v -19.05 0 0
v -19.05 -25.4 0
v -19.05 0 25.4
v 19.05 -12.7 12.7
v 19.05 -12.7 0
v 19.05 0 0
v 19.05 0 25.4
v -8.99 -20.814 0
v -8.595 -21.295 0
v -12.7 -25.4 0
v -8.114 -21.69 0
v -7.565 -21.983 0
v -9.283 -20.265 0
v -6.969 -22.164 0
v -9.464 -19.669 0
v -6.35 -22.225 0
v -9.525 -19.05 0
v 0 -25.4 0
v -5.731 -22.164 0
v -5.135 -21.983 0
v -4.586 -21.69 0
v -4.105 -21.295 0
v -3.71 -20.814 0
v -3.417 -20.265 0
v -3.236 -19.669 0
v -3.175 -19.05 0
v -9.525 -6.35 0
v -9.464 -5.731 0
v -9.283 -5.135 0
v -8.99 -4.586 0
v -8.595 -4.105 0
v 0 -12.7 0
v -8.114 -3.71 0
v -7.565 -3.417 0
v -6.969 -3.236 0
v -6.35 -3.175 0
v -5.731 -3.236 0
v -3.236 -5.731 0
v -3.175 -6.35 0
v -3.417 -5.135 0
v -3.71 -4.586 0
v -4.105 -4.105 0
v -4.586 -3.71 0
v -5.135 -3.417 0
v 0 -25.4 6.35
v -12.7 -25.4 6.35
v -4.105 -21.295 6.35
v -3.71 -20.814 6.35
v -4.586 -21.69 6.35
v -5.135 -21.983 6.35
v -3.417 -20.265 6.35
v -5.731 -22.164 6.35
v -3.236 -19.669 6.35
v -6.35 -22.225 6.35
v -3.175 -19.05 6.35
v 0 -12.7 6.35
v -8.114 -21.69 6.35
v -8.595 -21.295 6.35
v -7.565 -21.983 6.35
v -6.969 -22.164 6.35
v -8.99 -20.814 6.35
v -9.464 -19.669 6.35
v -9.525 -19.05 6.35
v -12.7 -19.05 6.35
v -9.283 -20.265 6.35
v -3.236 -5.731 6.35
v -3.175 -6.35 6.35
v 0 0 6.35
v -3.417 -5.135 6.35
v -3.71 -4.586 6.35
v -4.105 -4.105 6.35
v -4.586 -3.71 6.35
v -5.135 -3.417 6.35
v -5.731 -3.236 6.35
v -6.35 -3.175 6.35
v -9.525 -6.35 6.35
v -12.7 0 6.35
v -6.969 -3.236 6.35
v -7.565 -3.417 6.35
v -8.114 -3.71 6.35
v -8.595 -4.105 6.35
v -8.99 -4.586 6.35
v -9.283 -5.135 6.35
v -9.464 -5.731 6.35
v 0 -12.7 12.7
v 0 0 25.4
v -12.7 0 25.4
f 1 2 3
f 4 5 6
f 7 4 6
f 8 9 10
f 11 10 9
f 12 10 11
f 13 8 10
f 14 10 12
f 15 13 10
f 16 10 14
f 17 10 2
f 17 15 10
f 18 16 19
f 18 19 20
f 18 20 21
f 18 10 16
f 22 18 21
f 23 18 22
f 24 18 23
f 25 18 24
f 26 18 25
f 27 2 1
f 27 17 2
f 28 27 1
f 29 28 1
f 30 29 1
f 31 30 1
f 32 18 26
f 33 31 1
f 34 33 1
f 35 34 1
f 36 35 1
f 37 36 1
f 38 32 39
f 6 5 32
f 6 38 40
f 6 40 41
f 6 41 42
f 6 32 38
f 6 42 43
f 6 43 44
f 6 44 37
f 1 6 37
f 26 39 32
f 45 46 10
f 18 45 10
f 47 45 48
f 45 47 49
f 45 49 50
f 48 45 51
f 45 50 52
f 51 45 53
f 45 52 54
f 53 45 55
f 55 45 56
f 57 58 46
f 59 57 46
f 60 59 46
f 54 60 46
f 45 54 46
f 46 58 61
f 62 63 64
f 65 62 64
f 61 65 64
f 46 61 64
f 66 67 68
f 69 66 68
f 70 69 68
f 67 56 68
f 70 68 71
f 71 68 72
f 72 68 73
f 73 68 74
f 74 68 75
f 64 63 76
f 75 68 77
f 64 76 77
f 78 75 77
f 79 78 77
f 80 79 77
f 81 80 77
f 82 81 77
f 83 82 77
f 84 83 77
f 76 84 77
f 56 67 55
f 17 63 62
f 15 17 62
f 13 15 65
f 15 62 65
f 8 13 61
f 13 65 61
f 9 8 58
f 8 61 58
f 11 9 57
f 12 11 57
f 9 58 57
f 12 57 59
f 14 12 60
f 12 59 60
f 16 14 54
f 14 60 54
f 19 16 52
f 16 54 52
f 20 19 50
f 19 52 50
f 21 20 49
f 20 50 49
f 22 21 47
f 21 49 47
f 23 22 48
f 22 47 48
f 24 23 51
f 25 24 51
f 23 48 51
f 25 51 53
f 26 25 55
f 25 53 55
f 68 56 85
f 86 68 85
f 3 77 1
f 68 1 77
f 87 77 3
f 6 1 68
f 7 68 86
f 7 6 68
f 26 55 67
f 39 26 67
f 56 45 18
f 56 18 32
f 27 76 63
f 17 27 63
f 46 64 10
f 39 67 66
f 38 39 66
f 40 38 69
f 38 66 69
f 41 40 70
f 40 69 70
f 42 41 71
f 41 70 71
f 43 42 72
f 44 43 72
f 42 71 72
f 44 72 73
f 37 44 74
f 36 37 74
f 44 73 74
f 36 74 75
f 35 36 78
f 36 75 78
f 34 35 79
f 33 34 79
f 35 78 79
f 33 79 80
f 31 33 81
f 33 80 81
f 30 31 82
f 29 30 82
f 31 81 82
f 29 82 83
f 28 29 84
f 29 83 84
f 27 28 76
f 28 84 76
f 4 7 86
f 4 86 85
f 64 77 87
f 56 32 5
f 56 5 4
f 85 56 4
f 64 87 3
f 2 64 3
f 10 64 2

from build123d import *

# Parameters (mm, degrees)
F1_DEPTH = 19.05
F2_DEPTH = 19.05
F3_W     = 12.7
F3_H     = 19.05
F4_DEPTH = 25.4
F6_DEPTH = 6.35
F8_DEPTH = 6.35


with BuildPart() as f1:
    # F0 (on Right) → F1 (new body, symmetric)
    with BuildSketch(Plane.YZ):
        Polygon((-12.7, 0), (0, 0), (0, 25.4), (-12.7, 12.7), (-12.7, 6.35), align=None)
        Polygon((-25.4, 0), (-12.7, 0), (-12.7, 6.35), (-19.05, 6.35), align=None)
        Polygon((-12.7, 6.35), (-12.7, 12.7), (-19.05, 6.35), align=None)
        Polygon((-25.4, 6.35), (-25.4, 0), (-19.05, 6.35), align=None)
    extrude(amount=F1_DEPTH, both=True)

    # F0 (on Right) → F2 (cut)
    with BuildSketch(Plane.YZ):
        Polygon((-12.7, 6.35), (-12.7, 12.7), (-19.05, 6.35), align=None)
        Polygon((-25.4, 6.35), (-25.4, 0), (-19.05, 6.35), align=None)
        Polygon((-25.4, 0), (-12.7, 0), (-12.7, 6.35), (-19.05, 6.35), align=None)
    extrude(amount=F2_DEPTH, mode=Mode.SUBTRACT)

    # F3 (on face) → F4 (cut)
    with BuildSketch(Plane(origin=(0, 0, 0), x_dir=(-1, 0, 0), z_dir=(0, 1, 0))):
        with Locations((6.35, 15.875)):
            Rectangle(F3_W, F3_H)
    extrude(amount=-F4_DEPTH, mode=Mode.SUBTRACT)

    # F5 (on face) → F6 (cut)
    with BuildSketch(Plane(origin=(-19.05, 0, 0), x_dir=(0, -1, 0), z_dir=(-1, 0, 0))):
        Polygon((25.4, 6.35), (19.05, 6.35), (25.4, 0), align=None)
    extrude(amount=-F6_DEPTH, mode=Mode.SUBTRACT)

    # F7 (on face) → F8 (cut, through all)
    with BuildSketch(Plane.XY.offset(6.35)):
        with BuildLine():
            ThreePointArc((-3.175, -6.35), (-6.35, -3.175), (-9.525, -6.35))
            Line((-9.525, -6.35), (-9.525, -19.05))
            ThreePointArc((-9.525, -19.05), (-6.35, -22.225), (-3.175, -19.05))
            Line((-3.175, -19.05), (-3.175, -6.35))
        make_face()
    extrude(amount=-F8_DEPTH, mode=Mode.SUBTRACT)


solid = f1.part
